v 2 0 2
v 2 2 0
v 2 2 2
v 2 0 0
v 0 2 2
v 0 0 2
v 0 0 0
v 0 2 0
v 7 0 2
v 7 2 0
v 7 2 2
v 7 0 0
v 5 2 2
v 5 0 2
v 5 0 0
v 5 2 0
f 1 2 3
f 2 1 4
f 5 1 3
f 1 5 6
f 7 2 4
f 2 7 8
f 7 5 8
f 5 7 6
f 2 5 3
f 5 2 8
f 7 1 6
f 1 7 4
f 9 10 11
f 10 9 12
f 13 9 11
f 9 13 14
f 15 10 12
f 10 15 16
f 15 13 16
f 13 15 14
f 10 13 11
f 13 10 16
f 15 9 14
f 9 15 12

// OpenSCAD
union() {
  translate([0, 0, 0]) cube(size=[2,2,2], center=false);
  translate([5, 0, 0]) cube(size=[2,2,2], center=false);
}
